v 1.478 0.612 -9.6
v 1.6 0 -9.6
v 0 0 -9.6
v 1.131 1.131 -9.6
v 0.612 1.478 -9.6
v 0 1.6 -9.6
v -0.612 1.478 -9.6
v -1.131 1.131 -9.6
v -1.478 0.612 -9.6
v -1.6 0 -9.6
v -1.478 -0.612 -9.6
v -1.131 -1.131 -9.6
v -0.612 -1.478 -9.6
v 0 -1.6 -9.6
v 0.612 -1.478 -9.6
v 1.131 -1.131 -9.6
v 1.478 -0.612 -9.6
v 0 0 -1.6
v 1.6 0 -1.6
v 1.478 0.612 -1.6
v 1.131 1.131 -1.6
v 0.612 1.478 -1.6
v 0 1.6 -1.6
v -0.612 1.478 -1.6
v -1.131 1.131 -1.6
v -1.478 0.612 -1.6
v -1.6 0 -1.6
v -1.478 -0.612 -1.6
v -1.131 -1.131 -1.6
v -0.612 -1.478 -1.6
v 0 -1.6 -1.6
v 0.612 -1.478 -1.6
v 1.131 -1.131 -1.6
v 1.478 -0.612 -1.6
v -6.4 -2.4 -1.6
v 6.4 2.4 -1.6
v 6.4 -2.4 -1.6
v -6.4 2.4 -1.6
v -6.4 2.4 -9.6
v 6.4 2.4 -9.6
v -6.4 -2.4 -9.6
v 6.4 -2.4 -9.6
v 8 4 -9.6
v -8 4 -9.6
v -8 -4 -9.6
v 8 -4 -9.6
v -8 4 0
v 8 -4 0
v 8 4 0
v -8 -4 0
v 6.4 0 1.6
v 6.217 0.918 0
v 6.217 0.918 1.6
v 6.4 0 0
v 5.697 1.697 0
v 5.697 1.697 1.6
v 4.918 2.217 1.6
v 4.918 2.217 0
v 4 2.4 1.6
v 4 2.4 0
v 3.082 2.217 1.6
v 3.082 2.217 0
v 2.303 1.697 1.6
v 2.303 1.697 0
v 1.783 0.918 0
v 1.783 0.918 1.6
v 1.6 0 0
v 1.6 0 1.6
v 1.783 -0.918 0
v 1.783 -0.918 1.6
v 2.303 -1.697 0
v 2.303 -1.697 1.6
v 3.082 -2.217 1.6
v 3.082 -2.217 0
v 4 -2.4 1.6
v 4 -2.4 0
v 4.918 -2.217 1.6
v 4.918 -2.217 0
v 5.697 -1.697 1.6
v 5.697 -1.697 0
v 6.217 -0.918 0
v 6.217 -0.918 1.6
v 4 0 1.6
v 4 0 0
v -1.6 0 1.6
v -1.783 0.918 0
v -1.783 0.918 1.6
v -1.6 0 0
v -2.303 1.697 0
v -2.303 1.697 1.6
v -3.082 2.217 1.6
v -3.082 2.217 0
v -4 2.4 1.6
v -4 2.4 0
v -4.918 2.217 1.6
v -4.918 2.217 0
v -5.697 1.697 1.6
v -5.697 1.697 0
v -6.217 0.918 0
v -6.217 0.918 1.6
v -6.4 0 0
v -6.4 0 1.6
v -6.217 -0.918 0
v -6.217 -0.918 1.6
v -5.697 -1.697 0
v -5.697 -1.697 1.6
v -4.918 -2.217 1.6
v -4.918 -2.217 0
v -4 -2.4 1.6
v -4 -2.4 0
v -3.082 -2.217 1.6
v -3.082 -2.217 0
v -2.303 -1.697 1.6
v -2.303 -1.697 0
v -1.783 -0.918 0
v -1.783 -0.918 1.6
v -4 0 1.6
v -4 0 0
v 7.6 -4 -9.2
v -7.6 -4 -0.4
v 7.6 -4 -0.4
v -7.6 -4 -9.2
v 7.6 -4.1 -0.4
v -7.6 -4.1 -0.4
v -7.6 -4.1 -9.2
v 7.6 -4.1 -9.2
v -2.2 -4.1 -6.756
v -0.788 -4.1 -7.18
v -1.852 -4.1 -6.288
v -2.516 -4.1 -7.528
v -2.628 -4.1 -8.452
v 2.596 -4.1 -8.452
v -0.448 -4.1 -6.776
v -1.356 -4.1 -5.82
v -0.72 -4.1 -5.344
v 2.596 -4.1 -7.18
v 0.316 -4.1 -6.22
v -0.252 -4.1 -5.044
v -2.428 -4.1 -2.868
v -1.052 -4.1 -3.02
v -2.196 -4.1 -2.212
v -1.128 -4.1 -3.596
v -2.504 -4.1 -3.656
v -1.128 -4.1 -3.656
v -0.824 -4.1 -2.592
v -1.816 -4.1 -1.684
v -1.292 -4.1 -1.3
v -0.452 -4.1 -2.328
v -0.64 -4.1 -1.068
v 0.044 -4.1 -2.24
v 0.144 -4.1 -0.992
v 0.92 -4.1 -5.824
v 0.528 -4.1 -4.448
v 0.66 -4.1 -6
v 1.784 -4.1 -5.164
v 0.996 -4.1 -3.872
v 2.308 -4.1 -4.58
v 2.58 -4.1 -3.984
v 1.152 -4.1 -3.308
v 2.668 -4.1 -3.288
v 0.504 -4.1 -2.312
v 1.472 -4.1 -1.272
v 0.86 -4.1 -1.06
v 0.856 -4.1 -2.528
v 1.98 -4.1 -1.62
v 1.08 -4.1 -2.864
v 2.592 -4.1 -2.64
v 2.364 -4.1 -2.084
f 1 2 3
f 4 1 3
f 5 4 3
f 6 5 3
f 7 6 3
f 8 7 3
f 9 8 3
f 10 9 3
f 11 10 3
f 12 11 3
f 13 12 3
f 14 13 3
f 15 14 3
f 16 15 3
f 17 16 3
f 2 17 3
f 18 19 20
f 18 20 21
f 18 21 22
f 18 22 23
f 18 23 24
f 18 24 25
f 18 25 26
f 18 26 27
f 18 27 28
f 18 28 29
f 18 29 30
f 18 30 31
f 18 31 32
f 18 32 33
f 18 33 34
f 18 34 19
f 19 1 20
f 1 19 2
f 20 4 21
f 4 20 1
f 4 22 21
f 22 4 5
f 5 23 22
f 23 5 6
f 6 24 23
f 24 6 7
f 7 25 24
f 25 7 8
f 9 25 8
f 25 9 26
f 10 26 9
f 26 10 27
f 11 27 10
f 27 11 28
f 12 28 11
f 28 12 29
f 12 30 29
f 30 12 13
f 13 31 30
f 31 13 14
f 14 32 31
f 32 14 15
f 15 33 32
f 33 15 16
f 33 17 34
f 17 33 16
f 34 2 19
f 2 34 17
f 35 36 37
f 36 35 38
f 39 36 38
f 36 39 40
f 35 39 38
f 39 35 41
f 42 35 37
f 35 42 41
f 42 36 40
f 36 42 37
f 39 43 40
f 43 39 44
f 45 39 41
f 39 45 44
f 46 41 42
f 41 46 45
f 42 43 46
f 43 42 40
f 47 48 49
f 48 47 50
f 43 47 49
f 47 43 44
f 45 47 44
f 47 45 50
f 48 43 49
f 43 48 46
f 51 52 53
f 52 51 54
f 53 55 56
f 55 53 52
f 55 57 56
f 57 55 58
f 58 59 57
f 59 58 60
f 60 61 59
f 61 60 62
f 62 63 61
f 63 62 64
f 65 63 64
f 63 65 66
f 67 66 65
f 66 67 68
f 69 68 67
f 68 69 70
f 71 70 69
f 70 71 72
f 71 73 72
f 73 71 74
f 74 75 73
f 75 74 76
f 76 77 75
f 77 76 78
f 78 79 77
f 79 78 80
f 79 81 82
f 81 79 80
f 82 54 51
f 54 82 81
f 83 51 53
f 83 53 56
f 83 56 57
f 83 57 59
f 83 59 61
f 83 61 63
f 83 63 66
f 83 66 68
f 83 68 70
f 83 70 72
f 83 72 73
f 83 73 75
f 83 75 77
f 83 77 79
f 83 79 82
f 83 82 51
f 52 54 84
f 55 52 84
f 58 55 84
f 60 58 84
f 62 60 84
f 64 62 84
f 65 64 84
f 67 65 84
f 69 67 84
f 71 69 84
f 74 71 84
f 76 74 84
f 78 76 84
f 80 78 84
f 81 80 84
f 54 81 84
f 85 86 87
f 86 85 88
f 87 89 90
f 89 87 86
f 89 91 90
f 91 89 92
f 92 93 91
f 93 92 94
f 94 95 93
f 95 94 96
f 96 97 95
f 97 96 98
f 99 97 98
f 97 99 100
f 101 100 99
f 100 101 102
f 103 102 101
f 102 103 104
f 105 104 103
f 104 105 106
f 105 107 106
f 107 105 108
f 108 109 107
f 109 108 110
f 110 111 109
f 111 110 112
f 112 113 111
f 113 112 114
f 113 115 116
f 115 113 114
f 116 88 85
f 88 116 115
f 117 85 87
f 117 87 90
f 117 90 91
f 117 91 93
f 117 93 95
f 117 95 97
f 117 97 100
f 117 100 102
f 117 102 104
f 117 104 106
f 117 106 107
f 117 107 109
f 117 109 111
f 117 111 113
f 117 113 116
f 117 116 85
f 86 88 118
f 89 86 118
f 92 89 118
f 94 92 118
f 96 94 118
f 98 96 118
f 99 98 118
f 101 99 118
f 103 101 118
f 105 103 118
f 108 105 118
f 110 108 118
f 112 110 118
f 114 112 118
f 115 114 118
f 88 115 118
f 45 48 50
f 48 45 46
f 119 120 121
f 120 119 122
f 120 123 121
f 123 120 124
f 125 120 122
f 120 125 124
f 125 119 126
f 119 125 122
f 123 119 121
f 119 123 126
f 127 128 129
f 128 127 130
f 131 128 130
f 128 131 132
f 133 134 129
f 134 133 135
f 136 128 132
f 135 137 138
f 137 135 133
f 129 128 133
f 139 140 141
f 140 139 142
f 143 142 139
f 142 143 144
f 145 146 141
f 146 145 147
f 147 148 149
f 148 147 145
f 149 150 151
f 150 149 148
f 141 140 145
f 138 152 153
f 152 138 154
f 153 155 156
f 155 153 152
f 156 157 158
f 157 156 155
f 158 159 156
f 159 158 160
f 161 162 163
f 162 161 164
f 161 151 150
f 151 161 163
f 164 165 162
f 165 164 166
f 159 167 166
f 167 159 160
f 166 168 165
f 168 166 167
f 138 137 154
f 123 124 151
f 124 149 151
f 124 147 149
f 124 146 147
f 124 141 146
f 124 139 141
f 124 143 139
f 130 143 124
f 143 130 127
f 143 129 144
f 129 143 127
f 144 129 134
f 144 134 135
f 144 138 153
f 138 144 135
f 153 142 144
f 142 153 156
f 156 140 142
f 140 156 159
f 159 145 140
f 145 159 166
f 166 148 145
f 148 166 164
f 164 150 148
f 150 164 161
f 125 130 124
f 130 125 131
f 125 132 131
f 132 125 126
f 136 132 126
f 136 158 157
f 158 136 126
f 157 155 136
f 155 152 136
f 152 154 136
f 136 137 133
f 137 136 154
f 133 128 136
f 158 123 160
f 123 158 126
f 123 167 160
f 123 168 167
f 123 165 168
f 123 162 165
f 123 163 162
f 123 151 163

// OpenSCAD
// file: ../p/4-4edge.scad
use <../lib.scad>
function ldraw_lib__4_4edge() = [
// 0 Circle 1.0
// 0 Name: 4-4edge.dat
// 0 Author: James Jessiman
// 0 !LDRAW_ORG Primitive UPDATE 2017-01
// 0 !LICENSE Licensed under CC BY 2.0 and CC BY 4.0 : see CAreadme.txt
// 
// 0 BFC CERTIFY CCW
  [0,"BFC","CERTIFY"],
  [0,"BFC","CCW"],
// 
// 0 !HISTORY 1998-12-15 [PTadmin] Official Update 1998-10
// 0 !HISTORY 2005-12-28 [PTadmin] Official Update 2005-01
// 0 !HISTORY 2007-06-24 [PTadmin] Header formatted for Contributor Agreement
// 0 !HISTORY 2008-07-01 [PTadmin] Official Update 2008-01
// 0 !HISTORY 2017-01-15 [Steffen] BFCed
// 0 !HISTORY 2017-12-30 [PTadmin] Official Update 2017-01
// 
// 
// 2 24 1 0 0 0.9239 0 0.3827
  [2,24,1,0,0,0.9239,0,0.3827],
// 2 24 0.9239 0 0.3827 0.7071 0 0.7071
  [2,24,0.9239,0,0.3827,0.7071,0,0.7071],
// 2 24 0.7071 0 0.7071 0.3827 0 0.9239
  [2,24,0.7071,0,0.7071,0.3827,0,0.9239],
// 2 24 0.3827 0 0.9239 0 0 1
  [2,24,0.3827,0,0.9239,0,0,1],
// 2 24 0 0 1 -0.3827 0 0.9239
  [2,24,0,0,1,-0.3827,0,0.9239],
// 2 24 -0.3827 0 0.9239 -0.7071 0 0.7071
  [2,24,-0.3827,0,0.9239,-0.7071,0,0.7071],
// 2 24 -0.7071 0 0.7071 -0.9239 0 0.3827
  [2,24,-0.7071,0,0.7071,-0.9239,0,0.3827],
// 2 24 -0.9239 0 0.3827 -1 0 -0
  [2,24,-0.9239,0,0.3827,-1,0,-0],
// 2 24 -1 0 -0 -0.9239 0 -0.3827
  [2,24,-1,0,-0,-0.9239,0,-0.3827],
// 2 24 -0.9239 0 -0.3827 -0.7071 0 -0.7071
  [2,24,-0.9239,0,-0.3827,-0.7071,0,-0.7071],
// 2 24 -0.7071 0 -0.7071 -0.3827 0 -0.9239
  [2,24,-0.7071,0,-0.7071,-0.3827,0,-0.9239],
// 2 24 -0.3827 0 -0.9239 0 0 -1
  [2,24,-0.3827,0,-0.9239,0,0,-1],
// 2 24 0 0 -1 0.3827 0 -0.9239
  [2,24,0,0,-1,0.3827,0,-0.9239],
// 2 24 0.3827 0 -0.9239 0.7071 0 -0.7071
  [2,24,0.3827,0,-0.9239,0.7071,0,-0.7071],
// 2 24 0.7071 0 -0.7071 0.9239 0 -0.3827
  [2,24,0.7071,0,-0.7071,0.9239,0,-0.3827],
// 2 24 0.9239 0 -0.3827 1 0 0
  [2,24,0.9239,0,-0.3827,1,0,0],
];
module ldraw_lib__4_4edge(step=0, col=false, unit=2/5, alt=false, line=0.2, solid=!$preview)
    makepoly(ldraw_lib__4_4edge(), step=step, col=col, unit=unit, alt=alt, line=line, solid=solid);
ldraw_lib__4_4edge(line=0.2);
// file: ../p/4-4disc.scad
use <../lib.scad>
function ldraw_lib__4_4disc() = [
// 0 Disc 1.0
// 0 Name: 4-4disc.dat
// 0 Author: James Jessiman
// 0 !LDRAW_ORG Primitive UPDATE 2002-02
// 0 !LICENSE Licensed under CC BY 2.0 and CC BY 4.0 : see CAreadme.txt
// 
// 0 BFC CERTIFY CCW
  [0,"BFC","CERTIFY"],
  [0,"BFC","CCW"],
// 
// 0 !HISTORY 1998-12-15 [PTadmin] Official Update 1998-10
// 0 !HISTORY 2002-03-23 [sbliss] Added BFC statement
// 0 !HISTORY 2002-04-25 [PTadmin] Official Update 2002-02
// 0 !HISTORY 2007-06-24 [PTadmin] Header formatted for Contributor Agreement
// 0 !HISTORY 2008-07-01 [PTadmin] Official Update 2008-01
// 
// 
// 3 16 0 0 0 1 0 0 0.9239 0 0.3827
  [3,16,0,0,0,1,0,0,0.9239,0,0.3827],
// 3 16 0 0 0 0.9239 0 0.3827 0.7071 0 0.7071
  [3,16,0,0,0,0.9239,0,0.3827,0.7071,0,0.7071],
// 3 16 0 0 0 0.7071 0 0.7071 0.3827 0 0.9239
  [3,16,0,0,0,0.7071,0,0.7071,0.3827,0,0.9239],
// 3 16 0 0 0 0.3827 0 0.9239 0 0 1
  [3,16,0,0,0,0.3827,0,0.9239,0,0,1],
// 3 16 0 0 0 0 0 1 -0.3827 0 0.9239
  [3,16,0,0,0,0,0,1,-0.3827,0,0.9239],
// 3 16 0 0 0 -0.3827 0 0.9239 -0.7071 0 0.7071
  [3,16,0,0,0,-0.3827,0,0.9239,-0.7071,0,0.7071],
// 3 16 0 0 0 -0.7071 0 0.7071 -0.9239 0 0.3827
  [3,16,0,0,0,-0.7071,0,0.7071,-0.9239,0,0.3827],
// 3 16 0 0 0 -0.9239 0 0.3827 -1 0 -0
  [3,16,0,0,0,-0.9239,0,0.3827,-1,0,-0],
// 3 16 0 0 0 -1 0 -0 -0.9239 0 -0.3827
  [3,16,0,0,0,-1,0,-0,-0.9239,0,-0.3827],
// 3 16 0 0 0 -0.9239 0 -0.3827 -0.7071 0 -0.7071
  [3,16,0,0,0,-0.9239,0,-0.3827,-0.7071,0,-0.7071],
// 3 16 0 0 0 -0.7071 0 -0.7071 -0.3827 0 -0.9239
  [3,16,0,0,0,-0.7071,0,-0.7071,-0.3827,0,-0.9239],
// 3 16 0 0 0 -0.3827 0 -0.9239 0 0 -1
  [3,16,0,0,0,-0.3827,0,-0.9239,0,0,-1],
// 3 16 0 0 0 0 0 -1 0.3827 0 -0.9239
  [3,16,0,0,0,0,0,-1,0.3827,0,-0.9239],
// 3 16 0 0 0 0.3827 0 -0.9239 0.7071 0 -0.7071
  [3,16,0,0,0,0.3827,0,-0.9239,0.7071,0,-0.7071],
// 3 16 0 0 0 0.7071 0 -0.7071 0.9239 0 -0.3827
  [3,16,0,0,0,0.7071,0,-0.7071,0.9239,0,-0.3827],
// 3 16 0 0 0 0.9239 0 -0.3827 1 0 0
  [3,16,0,0,0,0.9239,0,-0.3827,1,0,0],
// 0
];
module ldraw_lib__4_4disc(step=0, col=false, unit=2/5, alt=false, line=0.2, solid=!$preview)
    makepoly(ldraw_lib__4_4disc(), step=step, col=col, unit=unit, alt=alt, line=line, solid=solid);
ldraw_lib__4_4disc(line=0.2);
// file: ../p/4-4cyli.scad
use <../lib.scad>
$fa=1; $fs=0.2;
function ldraw_lib__4_4cyli(realsolid=false) = [
// 0 Cylinder 1.0
// 0 Name: 4-4cyli.dat
// 0 Author: James Jessiman
// 0 !LDRAW_ORG Primitive UPDATE 2005-01
// 0 !LICENSE Licensed under CC BY 2.0 and CC BY 4.0 : see CAreadme.txt
// 
// 0 BFC CERTIFY CCW
  [0,"BFC","CERTIFY"],
  [0,"BFC","CCW"],
// 
// 0 !HISTORY 1998-12-15 [PTadmin] Official Update 1998-10
// 0 !HISTORY 2002-03-23 [sbliss] Added BFC statement; merged headers from files in distributions LDraw 0.27 and Complete.
// 0 !HISTORY 2002-04-25 [PTadmin] Official Update 2002-02
// 0 !HISTORY 2004-12-14 [guyvivan] BFC CCW
// 0 !HISTORY 2005-12-28 [PTadmin] Official Update 2005-01
// 0 !HISTORY 2007-06-24 [PTadmin] Header formatted for Contributor Agreement
// 0 !HISTORY 2008-07-01 [PTadmin] Official Update 2008-01
// 
// 
// 4 16 1 1 0 0.9239 1 0.3827 0.9239 0 0.3827 1 0 0
  [4,16,1,1,0,0.9239,1,0.3827,0.9239,0,0.3827,1,0,0],
// 5 24 1 0 0 1 1 0 0.9239 0 0.3827 0.9239 0 -0.3827
  [5,24,1,0,0,1,1,0,0.9239,0,0.3827,0.9239,0,-0.3827],
// 4 16 0.9239 1 0.3827 0.7071 1 0.7071 0.7071 0 0.7071 0.9239 0 0.3827
  [4,16,0.9239,1,0.3827,0.7071,1,0.7071,0.7071,0,0.7071,0.9239,0,0.3827],
// 5 24 0.9239 0 0.3827 0.9239 1 0.3827 0.7071 0 0.7071 1 0 0
  [5,24,0.9239,0,0.3827,0.9239,1,0.3827,0.7071,0,0.7071,1,0,0],
// 4 16 0.7071 1 0.7071 0.3827 1 0.9239 0.3827 0 0.9239 0.7071 0 0.7071
  [4,16,0.7071,1,0.7071,0.3827,1,0.9239,0.3827,0,0.9239,0.7071,0,0.7071],
// 5 24 0.7071 0 0.7071 0.7071 1 0.7071 0.3827 0 0.9239 0.9239 0 0.3827
  [5,24,0.7071,0,0.7071,0.7071,1,0.7071,0.3827,0,0.9239,0.9239,0,0.3827],
// 4 16 0.3827 1 0.9239 0 1 1 0 0 1 0.3827 0 0.9239
  [4,16,0.3827,1,0.9239,0,1,1,0,0,1,0.3827,0,0.9239],
// 5 24 0.3827 0 0.9239 0.3827 1 0.9239 0 0 1 0.7071 0 0.7071
  [5,24,0.3827,0,0.9239,0.3827,1,0.9239,0,0,1,0.7071,0,0.7071],
// 4 16 0 1 1 -0.3827 1 0.9239 -0.3827 0 0.9239 0 0 1
  [4,16,0,1,1,-0.3827,1,0.9239,-0.3827,0,0.9239,0,0,1],
// 5 24 0 0 1 0 1 1 -0.3827 0 0.9239 0.3827 0 0.9239
  [5,24,0,0,1,0,1,1,-0.3827,0,0.9239,0.3827,0,0.9239],
// 4 16 -0.3827 1 0.9239 -0.7071 1 0.7071 -0.7071 0 0.7071 -0.3827 0 0.9239
  [4,16,-0.3827,1,0.9239,-0.7071,1,0.7071,-0.7071,0,0.7071,-0.3827,0,0.9239],
// 5 24 -0.3827 0 0.9239 -0.3827 1 0.9239 -0.7071 0 0.7071 0 0 1
  [5,24,-0.3827,0,0.9239,-0.3827,1,0.9239,-0.7071,0,0.7071,0,0,1],
// 4 16 -0.7071 1 0.7071 -0.9239 1 0.3827 -0.9239 0 0.3827 -0.7071 0 0.7071
  [4,16,-0.7071,1,0.7071,-0.9239,1,0.3827,-0.9239,0,0.3827,-0.7071,0,0.7071],
// 5 24 -0.7071 0 0.7071 -0.7071 1 0.7071 -0.9239 0 0.3827 -0.3827 0 0.9239
  [5,24,-0.7071,0,0.7071,-0.7071,1,0.7071,-0.9239,0,0.3827,-0.3827,0,0.9239],
// 4 16 -0.9239 1 0.3827 -1 1 0 -1 0 0 -0.9239 0 0.3827
  [4,16,-0.9239,1,0.3827,-1,1,0,-1,0,0,-0.9239,0,0.3827],
// 5 24 -0.9239 0 0.3827 -0.9239 1 0.3827 -1 0 0 -0.7071 0 0.7071
  [5,24,-0.9239,0,0.3827,-0.9239,1,0.3827,-1,0,0,-0.7071,0,0.7071],
// 4 16 -1 1 0 -0.9239 1 -0.3827 -0.9239 0 -0.3827 -1 0 0
  [4,16,-1,1,0,-0.9239,1,-0.3827,-0.9239,0,-0.3827,-1,0,0],
// 5 24 -1 0 0 -1 1 0 -0.9239 0 -0.3827 -0.9239 0 0.3827
  [5,24,-1,0,0,-1,1,0,-0.9239,0,-0.3827,-0.9239,0,0.3827],
// 4 16 -0.9239 1 -0.3827 -0.7071 1 -0.7071 -0.7071 0 -0.7071 -0.9239 0 -0.3827
  [4,16,-0.9239,1,-0.3827,-0.7071,1,-0.7071,-0.7071,0,-0.7071,-0.9239,0,-0.3827],
// 5 24 -0.9239 0 -0.3827 -0.9239 1 -0.3827 -0.7071 0 -0.7071 -1 0 0
  [5,24,-0.9239,0,-0.3827,-0.9239,1,-0.3827,-0.7071,0,-0.7071,-1,0,0],
// 4 16 -0.7071 1 -0.7071 -0.3827 1 -0.9239 -0.3827 0 -0.9239 -0.7071 0 -0.7071
  [4,16,-0.7071,1,-0.7071,-0.3827,1,-0.9239,-0.3827,0,-0.9239,-0.7071,0,-0.7071],
// 5 24 -0.7071 0 -0.7071 -0.7071 1 -0.7071 -0.3827 0 -0.9239 -0.9239 0 -0.3827
  [5,24,-0.7071,0,-0.7071,-0.7071,1,-0.7071,-0.3827,0,-0.9239,-0.9239,0,-0.3827],
// 4 16 -0.3827 1 -0.9239 0 1 -1 0 0 -1 -0.3827 0 -0.9239
  [4,16,-0.3827,1,-0.9239,0,1,-1,0,0,-1,-0.3827,0,-0.9239],
// 5 24 -0.3827 0 -0.9239 -0.3827 1 -0.9239 0 0 -1 -0.7071 0 -0.7071
  [5,24,-0.3827,0,-0.9239,-0.3827,1,-0.9239,0,0,-1,-0.7071,0,-0.7071],
// 4 16 0 1 -1 0.3827 1 -0.9239 0.3827 0 -0.9239 0 0 -1
  [4,16,0,1,-1,0.3827,1,-0.9239,0.3827,0,-0.9239,0,0,-1],
// 5 24 0 0 -1 0 1 -1 0.3827 0 -0.9239 -0.3827 0 -0.9239
  [5,24,0,0,-1,0,1,-1,0.3827,0,-0.9239,-0.3827,0,-0.9239],
// 4 16 0.3827 1 -0.9239 0.7071 1 -0.7071 0.7071 0 -0.7071 0.3827 0 -0.9239
  [4,16,0.3827,1,-0.9239,0.7071,1,-0.7071,0.7071,0,-0.7071,0.3827,0,-0.9239],
// 5 24 0.3827 0 -0.9239 0.3827 1 -0.9239 0.7071 0 -0.7071 0 0 -1
  [5,24,0.3827,0,-0.9239,0.3827,1,-0.9239,0.7071,0,-0.7071,0,0,-1],
// 4 16 0.7071 1 -0.7071 0.9239 1 -0.3827 0.9239 0 -0.3827 0.7071 0 -0.7071
  [4,16,0.7071,1,-0.7071,0.9239,1,-0.3827,0.9239,0,-0.3827,0.7071,0,-0.7071],
// 5 24 0.7071 0 -0.7071 0.7071 1 -0.7071 0.9239 0 -0.3827 0.3827 0 -0.9239
  [5,24,0.7071,0,-0.7071,0.7071,1,-0.7071,0.9239,0,-0.3827,0.3827,0,-0.9239],
// 4 16 0.9239 1 -0.3827 1 1 0 1 0 0 0.9239 0 -0.3827
  [4,16,0.9239,1,-0.3827,1,1,0,1,0,0,0.9239,0,-0.3827],
// 5 24 0.9239 0 -0.3827 0.9239 1 -0.3827 1 0 0 0.7071 0 -0.7071
  [5,24,0.9239,0,-0.3827,0.9239,1,-0.3827,1,0,0,0.7071,0,-0.7071],
// 0
];
module ldraw_lib__4_4cyli(step=0, col=false, unit=2/5, alt=false, line=0.2, solid=!$preview)
    makepoly(ldraw_lib__4_4cyli(solid), step=step, col=col, unit=unit, alt=alt, line=line, solid=solid);
ldraw_lib__4_4cyli(line=0.2);
// file: ../p/stud3.scad
use <../lib.scad>
use <4-4cyli.scad>
use <4-4disc.scad>
use <4-4edge.scad>
function ldraw_lib__stud3() = [
// 0 Stud Tube Solid
// 0 Name: stud3.dat
// 0 Author: James Jessiman
// 0 !LDRAW_ORG Primitive UPDATE 2012-01
// 0 !LICENSE Licensed under CC BY 4.0 : see CAreadme.txt
// 
// 0 BFC CERTIFY CCW
  [0,"BFC","CERTIFY"],
  [0,"BFC","CCW"],
// 
// 0 !HISTORY 2002-04-04 [sbliss] Modified for BFC compliance
// 0 !HISTORY 2002-04-25 [PTadmin] Official Update 2002-02
// 0 !HISTORY 2007-06-24 [PTadmin] Header formatted for Contributor Agreement
// 0 !HISTORY 2008-07-01 [PTadmin] Official Update 2008-01
// 0 !HISTORY 2012-02-16 [Philo] Changed to CCW
// 0 !HISTORY 2012-03-30 [PTadmin] Official Update 2012-01
// 
// 
// 1 16 0 -4 0 4 0 0 0 1 0 0 0 4 4-4edge.dat
  [1,16,0,-4,0,4,0,0,0,1,0,0,0,4, ldraw_lib__4_4edge()],
// 1 16 0 0 0 4 0 0 0 1 0 0 0 4 4-4edge.dat
  [1,16,0,0,0,4,0,0,0,1,0,0,0,4, ldraw_lib__4_4edge()],
// 1 16 0 -4 0 4 0 0 0 1 0 0 0 4 4-4disc.dat
  [1,16,0,-4,0,4,0,0,0,1,0,0,0,4, ldraw_lib__4_4disc()],
  [-1,16,0,0,0,4,0,0,0,-1,0,0,0,4, ldraw_lib__4_4disc()],
// 1 16 0 -4 0 4 0 0 0 4 0 0 0 4 4-4cyli.dat
  [1,16,0,-4,0,4,0,0,0,4,0,0,0,4, ldraw_lib__4_4cyli()],
];
module ldraw_lib__stud3(step=0, col=false, unit=2/5, alt=false, line=0.2, solid=!$preview)
    makepoly(ldraw_lib__stud3(), step=step, col=col, unit=unit, alt=alt, line=line, solid=solid);
ldraw_lib__stud3(line=0.2);
// file: ../p/stud.scad
use <../lib.scad>
use <4-4cyli.scad>
use <4-4disc.scad>
use <4-4edge.scad>
function ldraw_lib__stud() = [
// 0 Stud
// 0 Name: stud.dat
// 0 Author: James Jessiman
// 0 !LDRAW_ORG Primitive UPDATE 2012-01
// 0 !LICENSE Licensed under CC BY 4.0 : see CAreadme.txt
// 
// 0 BFC CERTIFY CCW
  [0,"BFC","CERTIFY"],
  [0,"BFC","CCW"],
// 
// 0 !HISTORY 2002-04-04 [sbliss] Modified for BFC compliance
// 0 !HISTORY 2002-04-25 [PTadmin] Official Update 2002-02
// 0 !HISTORY 2007-06-24 [PTadmin] Header formatted for Contributor Agreement
// 0 !HISTORY 2008-07-01 [PTadmin] Official Update 2008-01
// 0 !HISTORY 2012-02-16 [Philo] Changed to CCW
// 0 !HISTORY 2012-03-30 [PTadmin] Official Update 2012-01
// 
// 
// 1 16 0 0 0 6 0 0 0 1 0 0 0 6 4-4edge.dat
  [1,16,0,0,0,6,0,0,0,1,0,0,0,6, ldraw_lib__4_4edge()],
// 1 16 0 -4 0 6 0 0 0 1 0 0 0 6 4-4edge.dat
  [1,16,0,-4,0,6,0,0,0,1,0,0,0,6, ldraw_lib__4_4edge()],
// 1 16 0 0 0 6 0 0 0 -4 0 0 0 6 4-4cyli.dat
  [1,16,0,0,0,6,0,0,0,-4,0,0,0,6, ldraw_lib__4_4cyli()],
// 1 16 0 -4 0 6 0 0 0 1 0 0 0 6 4-4disc.dat
  [1,16,0,-4,0,6,0,0,0,1,0,0,0,6, ldraw_lib__4_4disc()],
  [-1,16,0,0,0,6,0,0,0,-1,0,0,0,6, ldraw_lib__4_4disc()],
];
module ldraw_lib__stud(step=0, col=false, unit=2/5, alt=false, line=0.2, solid=!$preview)
    makepoly(ldraw_lib__stud(), step=step, col=col, unit=unit, alt=alt, line=line, solid=solid);
ldraw_lib__stud(line=0.2);
// file: ../p/box5.scad
use <../lib.scad>
function ldraw_lib__box5() = [
// 0 Box with 5 Faces and All Edges
// 0 Name: box5.dat
// 0 Author: James Jessiman
// 0 !LDRAW_ORG Primitive UPDATE 2012-01
// 0 !LICENSE Licensed under CC BY 2.0 and CC BY 4.0 : see CAreadme.txt
// 
// 0 BFC CERTIFY CCW
  [0,"BFC","CERTIFY"],
  [0,"BFC","CCW"],
// 
// 0 !HISTORY 2002-04-03 [sbliss] Modified for BFC compliance
// 0 !HISTORY 2002-04-25 [PTadmin] Official Update 2002-02
// 0 !HISTORY 2007-06-24 [PTadmin] Header formatted for Contributor Agreement
// 0 !HISTORY 2008-07-01 [PTadmin] Official Update 2008-01
// 0 !HISTORY 2012-02-16 [Philo] Changed to CCW
// 0 !HISTORY 2012-03-30 [PTadmin] Official Update 2012-01
// 
// 
// 2 24 1 1 1 -1 1 1
  [2,24,1,1,1,-1,1,1],
// 2 24 -1 1 1 -1 1 -1
  [2,24,-1,1,1,-1,1,-1],
// 2 24 -1 1 -1 1 1 -1
  [2,24,-1,1,-1,1,1,-1],
// 2 24 1 1 -1 1 1 1
  [2,24,1,1,-1,1,1,1],
// 2 24 1 0 1 -1 0 1
  [2,24,1,0,1,-1,0,1],
// 2 24 -1 0 1 -1 0 -1
  [2,24,-1,0,1,-1,0,-1],
// 2 24 -1 0 -1 1 0 -1
  [2,24,-1,0,-1,1,0,-1],
// 2 24 1 0 -1 1 0 1
  [2,24,1,0,-1,1,0,1],
// 2 24 1 0 1 1 1 1
  [2,24,1,0,1,1,1,1],
// 2 24 -1 0 1 -1 1 1
  [2,24,-1,0,1,-1,1,1],
// 2 24 1 0 -1 1 1 -1
  [2,24,1,0,-1,1,1,-1],
// 2 24 -1 0 -1 -1 1 -1
  [2,24,-1,0,-1,-1,1,-1],
// 4 16 -1 1 1 1 1 1 1 1 -1 -1 1 -1
  [4,16,-1,1,1,1,1,1,1,1,-1,-1,1,-1],
// 4 16 -1 1 1 -1 0 1 1 0 1 1 1 1
  [4,16,-1,1,1,-1,0,1,1,0,1,1,1,1],
// 4 16 -1 1 -1 -1 0 -1 -1 0 1 -1 1 1
  [4,16,-1,1,-1,-1,0,-1,-1,0,1,-1,1,1],
// 4 16 1 1 -1 1 0 -1 -1 0 -1 -1 1 -1
  [4,16,1,1,-1,1,0,-1,-1,0,-1,-1,1,-1],
// 4 16 1 1 1 1 0 1 1 0 -1 1 1 -1
  [4,16,1,1,1,1,0,1,1,0,-1,1,1,-1],
];
makepoly(ldraw_lib__box5(), line=0.2);
// file: ../p/box4t.scad
use <../lib.scad>
function ldraw_lib__box4t() = [
// 0 Box with 4 Adjacent Faces and All Edges
// 0 Name: box4t.dat
// 0 Author: Tore Eriksson [Tore_Eriksson]
// 0 !LDRAW_ORG Primitive UPDATE 2003-02
// 0 !LICENSE Licensed under CC BY 2.0 and CC BY 4.0 : see CAreadme.txt
// 
// 0 BFC CERTIFY CCW
  [0,"BFC","CERTIFY"],
  [0,"BFC","CCW"],
// 
// 0 !HISTORY 1997-09-29 [PTadmin] Official Update 1997-15
// 0 !HISTORY 2002-08-31 [izanette] Modified with WINDZ for BFC compliance
// 0 !HISTORY 2003-08-01 [PTadmin] Official Update 2003-02
// 0 !HISTORY 2007-06-24 [PTadmin] Header formatted for Contributor Agreement
// 0 !HISTORY 2008-07-01 [PTadmin] Official Update 2008-01
// 
// 
// 2 24 1 1 1 -1 1 1
  [2,24,1,1,1,-1,1,1],
// 2 24 -1 1 1 -1 1 -1
  [2,24,-1,1,1,-1,1,-1],
// 2 24 -1 1 -1 1 1 -1
  [2,24,-1,1,-1,1,1,-1],
// 2 24 1 1 -1 1 1 1
  [2,24,1,1,-1,1,1,1],
// 2 24 1 0 1 -1 0 1
  [2,24,1,0,1,-1,0,1],
// 2 24 -1 0 1 -1 0 -1
  [2,24,-1,0,1,-1,0,-1],
// 2 24 -1 0 -1 1 0 -1
  [2,24,-1,0,-1,1,0,-1],
// 2 24 1 0 -1 1 0 1
  [2,24,1,0,-1,1,0,1],
// 2 24 1 0 1 1 1 1
  [2,24,1,0,1,1,1,1],
// 2 24 -1 0 1 -1 1 1
  [2,24,-1,0,1,-1,1,1],
// 2 24 1 0 -1 1 1 -1
  [2,24,1,0,-1,1,1,-1],
// 2 24 -1 0 -1 -1 1 -1
  [2,24,-1,0,-1,-1,1,-1],
// 4 16 1 1 1 1 1 -1 -1 1 -1 -1 1 1
  [4,16,1,1,1,1,1,-1,-1,1,-1,-1,1,1],
// 4 16 1 1 1 -1 1 1 -1 0 1 1 0 1
  [4,16,1,1,1,-1,1,1,-1,0,1,1,0,1],
// 4 16 -1 1 1 -1 1 -1 -1 0 -1 -1 0 1
  [4,16,-1,1,1,-1,1,-1,-1,0,-1,-1,0,1],
// 0 4 16 -1 1 -1 -1 0 -1 1 0 -1 1 1 -1
// 4 16 1 1 -1 1 1 1 1 0 1 1 0 -1
  [4,16,1,1,-1,1,1,1,1,0,1,1,0,-1],
// 0
];
makepoly(ldraw_lib__box4t(), line=0.2);
// file: s/3004s01.scad
use <../../lib.scad>
use <../../p/box4t.scad>
use <../../p/box5.scad>
use <../../p/stud.scad>
use <../../p/stud3.scad>
$fa=1; $fs=0.2;
function ldraw_lib__s__3004s01(realsolid=false) = [
// 0 ~Brick  1 x  2 without Front Face
// 0 Name: s\3004s01.dat
// 0 Author: James Jessiman
// 0 !LDRAW_ORG Subpart UPDATE 2003-03
// 0 !LICENSE Licensed under CC BY 2.0 and CC BY 4.0 : see CAreadme.txt
// 
// 0 BFC CERTIFY CCW
  [0,"BFC","CERTIFY"],
  [0,"BFC","CCW"],
// 
// 0 !HISTORY 2003-09-07 [jriley] Subfiling, BFC
// 0 !HISTORY 2003-12-19 [PTadmin] Official Update 2003-03
// 0 !HISTORY 2007-08-29 [PTadmin] Header formatted for Contributor Agreement
// 0 !HISTORY 2008-07-01 [PTadmin] Official Update 2008-01
// 
// 
// 1 16 0 4 0 1 0 0 0 -5 0 0 0 1 stud3.dat
  [1,16,0,4,0,1,0,0,0,-5,0,0,0,1, ldraw_lib__stud3(realsolid)],
// 0 BFC INVERTNEXT
  [0,"BFC","INVERTNEXT"],
// 1 16 0 24 0 16 0 0 0 -20 0 0 0 6 box5.dat
  [1,16,0,24,0,16,0,0,0,-20,0,0,0,6, ldraw_lib__box5(realsolid)],
// 4 16 20 24 10 16 24 6 -16 24 6 -20 24 10
  [4,16,20,24,10,16,24,6,-16,24,6,-20,24,10],
// 4 16 -20 24 10 -16 24 6 -16 24 -6 -20 24 -10
  [4,16,-20,24,10,-16,24,6,-16,24,-6,-20,24,-10],
// 4 16 -20 24 -10 -16 24 -6 16 24 -6 20 24 -10
  [4,16,-20,24,-10,-16,24,-6,16,24,-6,20,24,-10],
// 4 16 20 24 -10 16 24 -6 16 24 6 20 24 10
  [4,16,20,24,-10,16,24,-6,16,24,6,20,24,10],
// 1 16 0 24 0 20 0 0 0 -24 0 0 0 10 box4t.dat
  [1,16,0,24,0,20,0,0,0,-24,0,0,0,10, ldraw_lib__box4t(realsolid)],
// 1 16 10 0 0 1 0 0 0 1 0 0 0 1 stud.dat
  [1,16,10,0,0,1,0,0,0,1,0,0,0,1, ldraw_lib__stud(realsolid)],
// 1 16 -10 0 0 1 0 0 0 1 0 0 0 1 stud.dat
  [1,16,-10,0,0,1,0,0,0,1,0,0,0,1, ldraw_lib__stud(realsolid)],
// 0
];
module ldraw_lib__s__3004s01(step=0, col=false, unit=2/5, alt=false, line=0.2, solid=!$preview)
    makepoly(ldraw_lib__s__3004s01(solid), step=step, col=col, unit=unit, alt=alt, line=line, solid=solid);
ldraw_lib__s__3004s01(line=0.2);
// file: s/004452cs02.scad
use <../../lib.scad>
$fa=1; $fs=0.2;
function ldraw_lib__s__004452cs02(realsolid=false) = [
// 0 ~Sticker  1.1 x  1.9 with Number "2" - Background
// 0 Name: s\004452cs02.dat
// 0 Author: Takeshi Takahashi [RainbowDolphin]
// 0 !LDRAW_ORG Subpart UPDATE 2022-04
// 0 !LICENSE Licensed under CC BY 2.0 and CC BY 4.0 : see CAreadme.txt
// 
// 0 BFC CERTIFY CCW
  [0,"BFC","CERTIFY"],
  [0,"BFC","CCW"],
// 
// 0 !HISTORY 2022-07-18 [PTadmin] Official Update 2022-04
// 
// 
// 3 16 19 -.25 11 -19 -.25 11 .36 -.25 9.52
  [3,16,19,-.25,11,-19,-.25,11,.36,-.25,9.52],
// 3 16 -19 -.25 11 -1.6 -.25 9.33 .36 -.25 9.52
  [3,16,-19,-.25,11,-1.6,-.25,9.33,.36,-.25,9.52],
// 3 16 -19 -.25 11 -3.23 -.25 8.75 -1.6 -.25 9.33
  [3,16,-19,-.25,11,-3.23,-.25,8.75,-1.6,-.25,9.33],
// 3 16 -19 -.25 11 -4.54 -.25 7.79 -3.23 -.25 8.75
  [3,16,-19,-.25,11,-4.54,-.25,7.79,-3.23,-.25,8.75],
// 3 16 -19 -.25 11 -5.49 -.25 6.47 -4.54 -.25 7.79
  [3,16,-19,-.25,11,-5.49,-.25,6.47,-4.54,-.25,7.79],
// 3 16 -19 -.25 11 -6.07 -.25 4.83 -5.49 -.25 6.47
  [3,16,-19,-.25,11,-6.07,-.25,4.83,-5.49,-.25,6.47],
// 3 16 -19 -.25 11 -6.26 -.25 2.86 -6.07 -.25 4.83
  [3,16,-19,-.25,11,-6.26,-.25,2.86,-6.07,-.25,4.83],
// 4 16 -6.26 -.25 2.86 -19 -.25 11 -6.29 -.25 -6.82 -5.5 -.25 -4.89
  [4,16,-6.26,-.25,2.86,-19,-.25,11,-6.29,-.25,-6.82,-5.5,-.25,-4.89],
// 4 16 -6.26 -.25 2.86 -5.5 -.25 -4.89 -4.63 -.25 -3.72 -2.82 -.25 2.86
  [4,16,-6.26,-.25,2.86,-5.5,-.25,-4.89,-4.63,-.25,-3.72,-2.82,-.25,2.86],
// 3 16 -2.82 -.25 2.86 -4.63 -.25 -3.72 -3.39 -.25 -2.55
  [3,16,-2.82,-.25,2.86,-4.63,-.25,-3.72,-3.39,-.25,-2.55],
// 3 16 -2.82 -.25 2.86 -3.39 -.25 -2.55 -1.8 -.25 -1.36
  [3,16,-2.82,-.25,2.86,-3.39,-.25,-2.55,-1.8,-.25,-1.36],
// 4 16 -2.82 -.25 2.86 -1.8 -.25 -1.36 -.63 -.25 -.61 1.32 -.25 .88
  [4,16,-2.82,-.25,2.86,-1.8,-.25,-1.36,-.63,-.25,-.61,1.32,-.25,.88],
// 4 16 -2.82 -.25 3.01 -2.82 -.25 2.86 1.32 -.25 .88 2.49 -.25 2.32
  [4,16,-2.82,-.25,3.01,-2.82,-.25,2.86,1.32,-.25,.88,2.49,-.25,2.32],
// 4 16 -2.63 -.25 4.45 -2.82 -.25 3.01 2.49 -.25 2.32 2.88 -.25 3.73
  [4,16,-2.63,-.25,4.45,-2.82,-.25,3.01,2.49,-.25,2.32,2.88,-.25,3.73],
// 4 16 -2.06 -.25 5.52 -2.63 -.25 4.45 2.88 -.25 3.73 2.7 -.25 4.84
  [4,16,-2.06,-.25,5.52,-2.63,-.25,4.45,2.88,-.25,3.73,2.7,-.25,4.84],
// 4 16 -1.13 -.25 6.18 -2.06 -.25 5.52 2.7 -.25 4.84 2.14 -.25 5.68
  [4,16,-1.13,-.25,6.18,-2.06,-.25,5.52,2.7,-.25,4.84,2.14,-.25,5.68],
// 4 16 .11 -.25 6.4 -1.13 -.25 6.18 2.14 -.25 5.68 1.26 -.25 6.22
  [4,16,.11,-.25,6.4,-1.13,-.25,6.18,2.14,-.25,5.68,1.26,-.25,6.22],
// 4 16 -6.57 -.25 -9.13 -6.29 -.25 -6.82 -19 -.25 11 -19 -.25 -11
  [4,16,-6.57,-.25,-9.13,-6.29,-.25,-6.82,-19,-.25,11,-19,-.25,-11],
// 4 16 6.49 -.25 -9.13 -6.57 -.25 -9.13 -19 -.25 -11 19 -.25 -11
  [4,16,6.49,-.25,-9.13,-6.57,-.25,-9.13,-19,-.25,-11,19,-.25,-11],
// 3 16 6.49 -.25 -5.95 6.49 -.25 -9.13 19 -.25 -11
  [3,16,6.49,-.25,-5.95,6.49,-.25,-9.13,19,-.25,-11],
// 4 16 6.49 -.25 -5.95 19 -.25 -11 6.45 -.25 2.04 5.77 -.25 .55
  [4,16,6.49,-.25,-5.95,19,-.25,-11,6.45,-.25,2.04,5.77,-.25,.55],
// 3 16 5.77 -.25 .55 4.46 -.25 -.91 6.49 -.25 -5.95
  [3,16,5.77,-.25,.55,4.46,-.25,-.91,6.49,-.25,-5.95],
// 3 16 4.46 -.25 -.91 2.3 -.25 -2.56 6.49 -.25 -5.95
  [3,16,4.46,-.25,-.91,2.3,-.25,-2.56,6.49,-.25,-5.95],
// 3 16 2.3 -.25 -2.56 1.65 -.25 -3 6.49 -.25 -5.95
  [3,16,2.3,-.25,-2.56,1.65,-.25,-3,6.49,-.25,-5.95],
// 4 16 6.49 -.25 -5.95 1.65 -.25 -3 .79 -.25 -3.55 -1.12 -.25 -4.94
  [4,16,6.49,-.25,-5.95,1.65,-.25,-3,.79,-.25,-3.55,-1.12,-.25,-4.94],
// 3 16 -1.12 -.25 -4.94 -1.97 -.25 -5.95 6.49 -.25 -5.95
  [3,16,-1.12,-.25,-4.94,-1.97,-.25,-5.95,6.49,-.25,-5.95],
// 4 16 6.45 -.25 2.04 19 -.25 -11 19 -.25 11 6.67 -.25 3.78
  [4,16,6.45,-.25,2.04,19,-.25,-11,19,-.25,11,6.67,-.25,3.78],
// 3 16 19 -.25 11 6.48 -.25 5.4 6.67 -.25 3.78
  [3,16,19,-.25,11,6.48,-.25,5.4,6.67,-.25,3.78],
// 3 16 19 -.25 11 5.91 -.25 6.79 6.48 -.25 5.4
  [3,16,19,-.25,11,5.91,-.25,6.79,6.48,-.25,5.4],
// 3 16 19 -.25 11 4.95 -.25 7.95 5.91 -.25 6.79
  [3,16,19,-.25,11,4.95,-.25,7.95,5.91,-.25,6.79],
// 3 16 19 -.25 11 3.68 -.25 8.82 4.95 -.25 7.95
  [3,16,19,-.25,11,3.68,-.25,8.82,4.95,-.25,7.95],
// 3 16 19 -.25 11 2.15 -.25 9.35 3.68 -.25 8.82
  [3,16,19,-.25,11,2.15,-.25,9.35,3.68,-.25,8.82],
// 3 16 19 -.25 11 .36 -.25 9.52 2.15 -.25 9.35
  [3,16,19,-.25,11,.36,-.25,9.52,2.15,-.25,9.35],
];
module ldraw_lib__s__004452cs02(step=0, col=false, unit=2/5, alt=false, line=0.2, solid=!$preview)
    makepoly(ldraw_lib__s__004452cs02(solid), step=step, col=col, unit=unit, alt=alt, line=line, solid=solid);
ldraw_lib__s__004452cs02(line=0.2);
// file: s/004452cs01.scad
use <../../lib.scad>
function ldraw_lib__s__004452cs01() = [
// 0 ~Sticker  1.1 x  1.9 with Number "2" - Type Face
// 0 Name: s\004452cs01.dat
// 0 Author: Takeshi Takahashi [RainbowDolphin]
// 0 !LDRAW_ORG Subpart UPDATE 2022-04
// 0 !LICENSE Licensed under CC BY 2.0 and CC BY 4.0 : see CAreadme.txt
// 
// 0 BFC CERTIFY CCW
  [0,"BFC","CERTIFY"],
  [0,"BFC","CCW"],
// 
// 0 !HISTORY 2022-07-18 [PTadmin] Official Update 2022-04
// 
// 
// 4 16 -5.5 -.25 -4.89 -6.29 -.25 -6.82 -1.97 -.25 -5.95 -4.63 -.25 -3.72
  [4,16,-5.5,-.25,-4.89,-6.29,-.25,-6.82,-1.97,-.25,-5.95,-4.63,-.25,-3.72],
// 4 16 -1.97 -.25 -5.95 -6.29 -.25 -6.82 -6.57 -.25 -9.13 6.49 -.25 -9.13
  [4,16,-1.97,-.25,-5.95,-6.29,-.25,-6.82,-6.57,-.25,-9.13,6.49,-.25,-9.13],
// 4 16 -3.39 -.25 -2.55 -4.63 -.25 -3.72 -1.12 -.25 -4.94 -1.8 -.25 -1.36
  [4,16,-3.39,-.25,-2.55,-4.63,-.25,-3.72,-1.12,-.25,-4.94,-1.8,-.25,-1.36],
// 3 16 6.49 -.25 -5.95 -1.97 -.25 -5.95 6.49 -.25 -9.13
  [3,16,6.49,-.25,-5.95,-1.97,-.25,-5.95,6.49,-.25,-9.13],
// 4 16 .79 -.25 -3.55 -.63 -.25 -.61 -1.8 -.25 -1.36 -1.12 -.25 -4.94
  [4,16,.79,-.25,-3.55,-.63,-.25,-.61,-1.8,-.25,-1.36,-1.12,-.25,-4.94],
// 3 16 -4.63 -.25 -3.72 -1.97 -.25 -5.95 -1.12 -.25 -4.94
  [3,16,-4.63,-.25,-3.72,-1.97,-.25,-5.95,-1.12,-.25,-4.94],
// 4 16 -2.63 -.25 4.45 -5.49 -.25 6.47 -6.07 -.25 4.83 -2.82 -.25 3.01
  [4,16,-2.63,-.25,4.45,-5.49,-.25,6.47,-6.07,-.25,4.83,-2.82,-.25,3.01],
// 4 16 -6.26 -.25 2.86 -2.82 -.25 2.86 -2.82 -.25 3.01 -6.07 -.25 4.83
  [4,16,-6.26,-.25,2.86,-2.82,-.25,2.86,-2.82,-.25,3.01,-6.07,-.25,4.83],
// 4 16 -4.54 -.25 7.79 -5.49 -.25 6.47 -2.06 -.25 5.52 -3.23 -.25 8.75
  [4,16,-4.54,-.25,7.79,-5.49,-.25,6.47,-2.06,-.25,5.52,-3.23,-.25,8.75],
// 4 16 -3.23 -.25 8.75 -2.06 -.25 5.52 -1.13 -.25 6.18 -1.6 -.25 9.33
  [4,16,-3.23,-.25,8.75,-2.06,-.25,5.52,-1.13,-.25,6.18,-1.6,-.25,9.33],
// 4 16 -1.6 -.25 9.33 -1.13 -.25 6.18 .11 -.25 6.4 .36 -.25 9.52
  [4,16,-1.6,-.25,9.33,-1.13,-.25,6.18,.11,-.25,6.4,.36,-.25,9.52],
// 3 16 -5.49 -.25 6.47 -2.63 -.25 4.45 -2.06 -.25 5.52
  [3,16,-5.49,-.25,6.47,-2.63,-.25,4.45,-2.06,-.25,5.52],
// 4 16 -.63 -.25 -.61 1.65 -.25 -3 2.3 -.25 -2.56 1.32 -.25 .88
  [4,16,-.63,-.25,-.61,1.65,-.25,-3,2.3,-.25,-2.56,1.32,-.25,.88],
// 4 16 4.46 -.25 -.91 2.49 -.25 2.32 1.32 -.25 .88 2.3 -.25 -2.56
  [4,16,4.46,-.25,-.91,2.49,-.25,2.32,1.32,-.25,.88,2.3,-.25,-2.56],
// 4 16 5.77 -.25 .55 6.45 -.25 2.04 2.49 -.25 2.32 4.46 -.25 -.91
  [4,16,5.77,-.25,.55,6.45,-.25,2.04,2.49,-.25,2.32,4.46,-.25,-.91],
// 4 16 2.88 -.25 3.73 2.49 -.25 2.32 6.45 -.25 2.04 6.67 -.25 3.78
  [4,16,2.88,-.25,3.73,2.49,-.25,2.32,6.45,-.25,2.04,6.67,-.25,3.78],
// 4 16 1.26 -.25 6.22 2.14 -.25 5.68 3.68 -.25 8.82 2.15 -.25 9.35
  [4,16,1.26,-.25,6.22,2.14,-.25,5.68,3.68,-.25,8.82,2.15,-.25,9.35],
// 4 16 1.26 -.25 6.22 2.15 -.25 9.35 .36 -.25 9.52 .11 -.25 6.4
  [4,16,1.26,-.25,6.22,2.15,-.25,9.35,.36,-.25,9.52,.11,-.25,6.4],
// 4 16 2.14 -.25 5.68 2.7 -.25 4.84 4.95 -.25 7.95 3.68 -.25 8.82
  [4,16,2.14,-.25,5.68,2.7,-.25,4.84,4.95,-.25,7.95,3.68,-.25,8.82],
// 4 16 2.88 -.25 3.73 6.67 -.25 3.78 6.48 -.25 5.4 2.7 -.25 4.84
  [4,16,2.88,-.25,3.73,6.67,-.25,3.78,6.48,-.25,5.4,2.7,-.25,4.84],
// 4 16 2.7 -.25 4.84 6.48 -.25 5.4 5.91 -.25 6.79 4.95 -.25 7.95
  [4,16,2.7,-.25,4.84,6.48,-.25,5.4,5.91,-.25,6.79,4.95,-.25,7.95],
// 3 16 -.63 -.25 -.61 .79 -.25 -3.55 1.65 -.25 -3
  [3,16,-.63,-.25,-.61,.79,-.25,-3.55,1.65,-.25,-3],
];
makepoly(ldraw_lib__s__004452cs01(), line=0.2);
// file: ../p/box5-12.scad
use <../lib.scad>
function ldraw_lib__box5_12() = [
// 0 Box with 5 Faces without Any Edges
// 0 Name: box5-12.dat
// 0 Author: Chris Dee [cwdee]
// 0 !LDRAW_ORG Primitive UPDATE 2009-02
// 0 !LICENSE Licensed under CC BY 2.0 and CC BY 4.0 : see CAreadme.txt
// 
// 0 BFC CERTIFY CCW
  [0,"BFC","CERTIFY"],
  [0,"BFC","CCW"],
// 
// 0 !HISTORY 2009-09-03 [PTadmin] Official Update 2009-02
// 
// 
// 4 16 1 1 1 1 1 -1 -1 1 -1 -1 1 1
  [4,16,1,1,1,1,1,-1,-1,1,-1,-1,1,1],
// 4 16 -1 0 1 1 0 1 1 1 1 -1 1 1
  [4,16,-1,0,1,1,0,1,1,1,1,-1,1,1],
// 4 16 -1 0 -1 -1 0 1 -1 1 1 -1 1 -1
  [4,16,-1,0,-1,-1,0,1,-1,1,1,-1,1,-1],
// 4 16 1 0 -1 -1 0 -1 -1 1 -1 1 1 -1
  [4,16,1,0,-1,-1,0,-1,-1,1,-1,1,1,-1],
// 4 16 1 0 1 1 0 -1 1 1 -1 1 1 1
  [4,16,1,0,1,1,0,-1,1,1,-1,1,1,1],
// 0
];
module ldraw_lib__box5_12(step=0, col=false, unit=2/5, alt=false, line=0.2, solid=!$preview)
    makepoly(ldraw_lib__box5_12(), step=step, col=col, unit=unit, alt=alt, line=line, solid=solid);
ldraw_lib__box5_12(line=0.2);
// file: 3004.scad
use <../lib.scad>
use <s/3004s01.scad>
function ldraw_lib__3004() = [
// 0 Brick  1 x  2
// 0 Name: 3004.dat
// 0 Author: James Jessiman
// 0 !LDRAW_ORG Part UPDATE 2022-05
// 0 !LICENSE Licensed under CC BY 2.0 and CC BY 4.0 : see CAreadme.txt
// 
// 0 BFC CERTIFY CCW
  [0,"BFC","CERTIFY"],
  [0,"BFC","CCW"],
// 
// 0 !HISTORY 2001-10-26 [PTadmin] Official Update 2001-01
// 0 !HISTORY 2002-05-07 {unknown} BFC Certification
// 0 !HISTORY 2002-06-11 [PTadmin] Official Update 2002-03
// 0 !HISTORY 2007-05-07 [PTadmin] Header formatted for Contributor Agreement
// 0 !HISTORY 2008-07-01 [PTadmin] Official Update 2008-01
// 0 !HISTORY 2022-08-04 [MagFors] Using subfile
// 0 !HISTORY 2022-09-15 [PTadmin] Official Update 2022-05
// 
// 
// 1 16 0 0 0 1 0 0 0 1 0 0 0 1 s\3004s01.dat
  [1,16,0,0,0,1,0,0,0,1,0,0,0,1, ldraw_lib__s__3004s01()],
// 4 16 -20 24 -10 20 24 -10 20 0 -10 -20 0 -10
  [4,16,-20,24,-10,20,24,-10,20,0,-10,-20,0,-10],
];
module ldraw_lib__3004(step=0, col=false, unit=2/5, alt=false, line=0.2, solid=!$preview)
    makepoly(ldraw_lib__3004(), step=step, col=col, unit=unit, alt=alt, line=line, solid=solid);
ldraw_lib__3004(line=0.2);
// file: 004452c.scad
use <../lib.scad>
use <../p/box5-12.scad>
use <s/004452cs01.scad>
use <s/004452cs02.scad>
function ldraw_lib__004452c() = [
// 0 Sticker  1.1 x  1.9 with Black Number "2" on Yellow Background
// 0 Name: 004452c.dat
// 0 Author: Takeshi Takahashi [RainbowDolphin]
// 0 !LDRAW_ORG Part UPDATE 2022-04
// 0 !LICENSE Licensed under CC BY 2.0 and CC BY 4.0 : see CAreadme.txt
// 
// 0 BFC CERTIFY CCW
  [0,"BFC","CERTIFY"],
  [0,"BFC","CCW"],
// 
// 0 !KEYWORDS Fire Station, Set 374-1
// 
// 0 !HISTORY 2022-07-18 [PTadmin] Official Update 2022-04
// 
// 
// 1 16 0 -0.25 0 19 0 0 0 0.25 0 0 0 11 box5-12.dat
  [1,16,0,-0.25,0,19,0,0,0,0.25,0,0,0,11, ldraw_lib__box5_12()],
// 1 0 0 0 0 1 0 0 0 1 0 0 0 1 s\004452cs01.dat
  [1,0,0,0,0,1,0,0,0,1,0,0,0,1, ldraw_lib__s__004452cs01()],
// 1 14 0 0 0 1 0 0 0 1 0 0 0 1 s\004452cs02.dat
  [1,14,0,0,0,1,0,0,0,1,0,0,0,1, ldraw_lib__s__004452cs02()],
];
module ldraw_lib__004452c(step=0, col=false, unit=2/5, alt=false, line=0.2, solid=!$preview)
    makepoly(ldraw_lib__004452c(), step=step, col=col, unit=unit, alt=alt, line=line, solid=solid);
ldraw_lib__004452c(line=0.2);
// main file
use <../lib.scad>
use <004452c.scad>
use <3004.scad>
function ldraw_lib__3004d08() = [
// 0 Brick  1 x  2 with Black Number "2" on Yellow Background Sticker
// 0 Name: 3004d08.dat
// 0 Author: Takeshi Takahashi [RainbowDolphin]
// 0 !LDRAW_ORG Shortcut UPDATE 2024-04
// 0 !LICENSE Licensed under CC BY 4.0 : see CAreadme.txt
// 
// 0 BFC CERTIFY CCW
  [0,"BFC","CERTIFY"],
  [0,"BFC","CCW"],
// 
// 0 !CATEGORY Sticker Shortcut
// 0 !KEYWORDS Bricklink 3004pb002, Fire Station, Set 374-1
// 
// 0 !HISTORY 2024-05-28 [OrionP] Official Update 2024-04
// 
// 1 16 0 0 0 1 0 0 0 1 0 0 0 1 3004.dat
  [1,16,0,0,0,1,0,0,0,1,0,0,0,1, ldraw_lib__3004()],
// 1 16 0 12 -10 1 0 0 0 0 -1 0 1 0 004452c.dat
  [1,16,0,12,-10,1,0,0,0,0,-1,0,1,0, ldraw_lib__004452c()],
];
module ldraw_lib__3004d08(step=0, col=false, unit=2/5, alt=false, line=0.2, solid=!$preview)
    makepoly(ldraw_lib__3004d08(), step=step, col=col, unit=unit, alt=alt, line=line, solid=solid);
ldraw_lib__3004d08(line=0.2);
